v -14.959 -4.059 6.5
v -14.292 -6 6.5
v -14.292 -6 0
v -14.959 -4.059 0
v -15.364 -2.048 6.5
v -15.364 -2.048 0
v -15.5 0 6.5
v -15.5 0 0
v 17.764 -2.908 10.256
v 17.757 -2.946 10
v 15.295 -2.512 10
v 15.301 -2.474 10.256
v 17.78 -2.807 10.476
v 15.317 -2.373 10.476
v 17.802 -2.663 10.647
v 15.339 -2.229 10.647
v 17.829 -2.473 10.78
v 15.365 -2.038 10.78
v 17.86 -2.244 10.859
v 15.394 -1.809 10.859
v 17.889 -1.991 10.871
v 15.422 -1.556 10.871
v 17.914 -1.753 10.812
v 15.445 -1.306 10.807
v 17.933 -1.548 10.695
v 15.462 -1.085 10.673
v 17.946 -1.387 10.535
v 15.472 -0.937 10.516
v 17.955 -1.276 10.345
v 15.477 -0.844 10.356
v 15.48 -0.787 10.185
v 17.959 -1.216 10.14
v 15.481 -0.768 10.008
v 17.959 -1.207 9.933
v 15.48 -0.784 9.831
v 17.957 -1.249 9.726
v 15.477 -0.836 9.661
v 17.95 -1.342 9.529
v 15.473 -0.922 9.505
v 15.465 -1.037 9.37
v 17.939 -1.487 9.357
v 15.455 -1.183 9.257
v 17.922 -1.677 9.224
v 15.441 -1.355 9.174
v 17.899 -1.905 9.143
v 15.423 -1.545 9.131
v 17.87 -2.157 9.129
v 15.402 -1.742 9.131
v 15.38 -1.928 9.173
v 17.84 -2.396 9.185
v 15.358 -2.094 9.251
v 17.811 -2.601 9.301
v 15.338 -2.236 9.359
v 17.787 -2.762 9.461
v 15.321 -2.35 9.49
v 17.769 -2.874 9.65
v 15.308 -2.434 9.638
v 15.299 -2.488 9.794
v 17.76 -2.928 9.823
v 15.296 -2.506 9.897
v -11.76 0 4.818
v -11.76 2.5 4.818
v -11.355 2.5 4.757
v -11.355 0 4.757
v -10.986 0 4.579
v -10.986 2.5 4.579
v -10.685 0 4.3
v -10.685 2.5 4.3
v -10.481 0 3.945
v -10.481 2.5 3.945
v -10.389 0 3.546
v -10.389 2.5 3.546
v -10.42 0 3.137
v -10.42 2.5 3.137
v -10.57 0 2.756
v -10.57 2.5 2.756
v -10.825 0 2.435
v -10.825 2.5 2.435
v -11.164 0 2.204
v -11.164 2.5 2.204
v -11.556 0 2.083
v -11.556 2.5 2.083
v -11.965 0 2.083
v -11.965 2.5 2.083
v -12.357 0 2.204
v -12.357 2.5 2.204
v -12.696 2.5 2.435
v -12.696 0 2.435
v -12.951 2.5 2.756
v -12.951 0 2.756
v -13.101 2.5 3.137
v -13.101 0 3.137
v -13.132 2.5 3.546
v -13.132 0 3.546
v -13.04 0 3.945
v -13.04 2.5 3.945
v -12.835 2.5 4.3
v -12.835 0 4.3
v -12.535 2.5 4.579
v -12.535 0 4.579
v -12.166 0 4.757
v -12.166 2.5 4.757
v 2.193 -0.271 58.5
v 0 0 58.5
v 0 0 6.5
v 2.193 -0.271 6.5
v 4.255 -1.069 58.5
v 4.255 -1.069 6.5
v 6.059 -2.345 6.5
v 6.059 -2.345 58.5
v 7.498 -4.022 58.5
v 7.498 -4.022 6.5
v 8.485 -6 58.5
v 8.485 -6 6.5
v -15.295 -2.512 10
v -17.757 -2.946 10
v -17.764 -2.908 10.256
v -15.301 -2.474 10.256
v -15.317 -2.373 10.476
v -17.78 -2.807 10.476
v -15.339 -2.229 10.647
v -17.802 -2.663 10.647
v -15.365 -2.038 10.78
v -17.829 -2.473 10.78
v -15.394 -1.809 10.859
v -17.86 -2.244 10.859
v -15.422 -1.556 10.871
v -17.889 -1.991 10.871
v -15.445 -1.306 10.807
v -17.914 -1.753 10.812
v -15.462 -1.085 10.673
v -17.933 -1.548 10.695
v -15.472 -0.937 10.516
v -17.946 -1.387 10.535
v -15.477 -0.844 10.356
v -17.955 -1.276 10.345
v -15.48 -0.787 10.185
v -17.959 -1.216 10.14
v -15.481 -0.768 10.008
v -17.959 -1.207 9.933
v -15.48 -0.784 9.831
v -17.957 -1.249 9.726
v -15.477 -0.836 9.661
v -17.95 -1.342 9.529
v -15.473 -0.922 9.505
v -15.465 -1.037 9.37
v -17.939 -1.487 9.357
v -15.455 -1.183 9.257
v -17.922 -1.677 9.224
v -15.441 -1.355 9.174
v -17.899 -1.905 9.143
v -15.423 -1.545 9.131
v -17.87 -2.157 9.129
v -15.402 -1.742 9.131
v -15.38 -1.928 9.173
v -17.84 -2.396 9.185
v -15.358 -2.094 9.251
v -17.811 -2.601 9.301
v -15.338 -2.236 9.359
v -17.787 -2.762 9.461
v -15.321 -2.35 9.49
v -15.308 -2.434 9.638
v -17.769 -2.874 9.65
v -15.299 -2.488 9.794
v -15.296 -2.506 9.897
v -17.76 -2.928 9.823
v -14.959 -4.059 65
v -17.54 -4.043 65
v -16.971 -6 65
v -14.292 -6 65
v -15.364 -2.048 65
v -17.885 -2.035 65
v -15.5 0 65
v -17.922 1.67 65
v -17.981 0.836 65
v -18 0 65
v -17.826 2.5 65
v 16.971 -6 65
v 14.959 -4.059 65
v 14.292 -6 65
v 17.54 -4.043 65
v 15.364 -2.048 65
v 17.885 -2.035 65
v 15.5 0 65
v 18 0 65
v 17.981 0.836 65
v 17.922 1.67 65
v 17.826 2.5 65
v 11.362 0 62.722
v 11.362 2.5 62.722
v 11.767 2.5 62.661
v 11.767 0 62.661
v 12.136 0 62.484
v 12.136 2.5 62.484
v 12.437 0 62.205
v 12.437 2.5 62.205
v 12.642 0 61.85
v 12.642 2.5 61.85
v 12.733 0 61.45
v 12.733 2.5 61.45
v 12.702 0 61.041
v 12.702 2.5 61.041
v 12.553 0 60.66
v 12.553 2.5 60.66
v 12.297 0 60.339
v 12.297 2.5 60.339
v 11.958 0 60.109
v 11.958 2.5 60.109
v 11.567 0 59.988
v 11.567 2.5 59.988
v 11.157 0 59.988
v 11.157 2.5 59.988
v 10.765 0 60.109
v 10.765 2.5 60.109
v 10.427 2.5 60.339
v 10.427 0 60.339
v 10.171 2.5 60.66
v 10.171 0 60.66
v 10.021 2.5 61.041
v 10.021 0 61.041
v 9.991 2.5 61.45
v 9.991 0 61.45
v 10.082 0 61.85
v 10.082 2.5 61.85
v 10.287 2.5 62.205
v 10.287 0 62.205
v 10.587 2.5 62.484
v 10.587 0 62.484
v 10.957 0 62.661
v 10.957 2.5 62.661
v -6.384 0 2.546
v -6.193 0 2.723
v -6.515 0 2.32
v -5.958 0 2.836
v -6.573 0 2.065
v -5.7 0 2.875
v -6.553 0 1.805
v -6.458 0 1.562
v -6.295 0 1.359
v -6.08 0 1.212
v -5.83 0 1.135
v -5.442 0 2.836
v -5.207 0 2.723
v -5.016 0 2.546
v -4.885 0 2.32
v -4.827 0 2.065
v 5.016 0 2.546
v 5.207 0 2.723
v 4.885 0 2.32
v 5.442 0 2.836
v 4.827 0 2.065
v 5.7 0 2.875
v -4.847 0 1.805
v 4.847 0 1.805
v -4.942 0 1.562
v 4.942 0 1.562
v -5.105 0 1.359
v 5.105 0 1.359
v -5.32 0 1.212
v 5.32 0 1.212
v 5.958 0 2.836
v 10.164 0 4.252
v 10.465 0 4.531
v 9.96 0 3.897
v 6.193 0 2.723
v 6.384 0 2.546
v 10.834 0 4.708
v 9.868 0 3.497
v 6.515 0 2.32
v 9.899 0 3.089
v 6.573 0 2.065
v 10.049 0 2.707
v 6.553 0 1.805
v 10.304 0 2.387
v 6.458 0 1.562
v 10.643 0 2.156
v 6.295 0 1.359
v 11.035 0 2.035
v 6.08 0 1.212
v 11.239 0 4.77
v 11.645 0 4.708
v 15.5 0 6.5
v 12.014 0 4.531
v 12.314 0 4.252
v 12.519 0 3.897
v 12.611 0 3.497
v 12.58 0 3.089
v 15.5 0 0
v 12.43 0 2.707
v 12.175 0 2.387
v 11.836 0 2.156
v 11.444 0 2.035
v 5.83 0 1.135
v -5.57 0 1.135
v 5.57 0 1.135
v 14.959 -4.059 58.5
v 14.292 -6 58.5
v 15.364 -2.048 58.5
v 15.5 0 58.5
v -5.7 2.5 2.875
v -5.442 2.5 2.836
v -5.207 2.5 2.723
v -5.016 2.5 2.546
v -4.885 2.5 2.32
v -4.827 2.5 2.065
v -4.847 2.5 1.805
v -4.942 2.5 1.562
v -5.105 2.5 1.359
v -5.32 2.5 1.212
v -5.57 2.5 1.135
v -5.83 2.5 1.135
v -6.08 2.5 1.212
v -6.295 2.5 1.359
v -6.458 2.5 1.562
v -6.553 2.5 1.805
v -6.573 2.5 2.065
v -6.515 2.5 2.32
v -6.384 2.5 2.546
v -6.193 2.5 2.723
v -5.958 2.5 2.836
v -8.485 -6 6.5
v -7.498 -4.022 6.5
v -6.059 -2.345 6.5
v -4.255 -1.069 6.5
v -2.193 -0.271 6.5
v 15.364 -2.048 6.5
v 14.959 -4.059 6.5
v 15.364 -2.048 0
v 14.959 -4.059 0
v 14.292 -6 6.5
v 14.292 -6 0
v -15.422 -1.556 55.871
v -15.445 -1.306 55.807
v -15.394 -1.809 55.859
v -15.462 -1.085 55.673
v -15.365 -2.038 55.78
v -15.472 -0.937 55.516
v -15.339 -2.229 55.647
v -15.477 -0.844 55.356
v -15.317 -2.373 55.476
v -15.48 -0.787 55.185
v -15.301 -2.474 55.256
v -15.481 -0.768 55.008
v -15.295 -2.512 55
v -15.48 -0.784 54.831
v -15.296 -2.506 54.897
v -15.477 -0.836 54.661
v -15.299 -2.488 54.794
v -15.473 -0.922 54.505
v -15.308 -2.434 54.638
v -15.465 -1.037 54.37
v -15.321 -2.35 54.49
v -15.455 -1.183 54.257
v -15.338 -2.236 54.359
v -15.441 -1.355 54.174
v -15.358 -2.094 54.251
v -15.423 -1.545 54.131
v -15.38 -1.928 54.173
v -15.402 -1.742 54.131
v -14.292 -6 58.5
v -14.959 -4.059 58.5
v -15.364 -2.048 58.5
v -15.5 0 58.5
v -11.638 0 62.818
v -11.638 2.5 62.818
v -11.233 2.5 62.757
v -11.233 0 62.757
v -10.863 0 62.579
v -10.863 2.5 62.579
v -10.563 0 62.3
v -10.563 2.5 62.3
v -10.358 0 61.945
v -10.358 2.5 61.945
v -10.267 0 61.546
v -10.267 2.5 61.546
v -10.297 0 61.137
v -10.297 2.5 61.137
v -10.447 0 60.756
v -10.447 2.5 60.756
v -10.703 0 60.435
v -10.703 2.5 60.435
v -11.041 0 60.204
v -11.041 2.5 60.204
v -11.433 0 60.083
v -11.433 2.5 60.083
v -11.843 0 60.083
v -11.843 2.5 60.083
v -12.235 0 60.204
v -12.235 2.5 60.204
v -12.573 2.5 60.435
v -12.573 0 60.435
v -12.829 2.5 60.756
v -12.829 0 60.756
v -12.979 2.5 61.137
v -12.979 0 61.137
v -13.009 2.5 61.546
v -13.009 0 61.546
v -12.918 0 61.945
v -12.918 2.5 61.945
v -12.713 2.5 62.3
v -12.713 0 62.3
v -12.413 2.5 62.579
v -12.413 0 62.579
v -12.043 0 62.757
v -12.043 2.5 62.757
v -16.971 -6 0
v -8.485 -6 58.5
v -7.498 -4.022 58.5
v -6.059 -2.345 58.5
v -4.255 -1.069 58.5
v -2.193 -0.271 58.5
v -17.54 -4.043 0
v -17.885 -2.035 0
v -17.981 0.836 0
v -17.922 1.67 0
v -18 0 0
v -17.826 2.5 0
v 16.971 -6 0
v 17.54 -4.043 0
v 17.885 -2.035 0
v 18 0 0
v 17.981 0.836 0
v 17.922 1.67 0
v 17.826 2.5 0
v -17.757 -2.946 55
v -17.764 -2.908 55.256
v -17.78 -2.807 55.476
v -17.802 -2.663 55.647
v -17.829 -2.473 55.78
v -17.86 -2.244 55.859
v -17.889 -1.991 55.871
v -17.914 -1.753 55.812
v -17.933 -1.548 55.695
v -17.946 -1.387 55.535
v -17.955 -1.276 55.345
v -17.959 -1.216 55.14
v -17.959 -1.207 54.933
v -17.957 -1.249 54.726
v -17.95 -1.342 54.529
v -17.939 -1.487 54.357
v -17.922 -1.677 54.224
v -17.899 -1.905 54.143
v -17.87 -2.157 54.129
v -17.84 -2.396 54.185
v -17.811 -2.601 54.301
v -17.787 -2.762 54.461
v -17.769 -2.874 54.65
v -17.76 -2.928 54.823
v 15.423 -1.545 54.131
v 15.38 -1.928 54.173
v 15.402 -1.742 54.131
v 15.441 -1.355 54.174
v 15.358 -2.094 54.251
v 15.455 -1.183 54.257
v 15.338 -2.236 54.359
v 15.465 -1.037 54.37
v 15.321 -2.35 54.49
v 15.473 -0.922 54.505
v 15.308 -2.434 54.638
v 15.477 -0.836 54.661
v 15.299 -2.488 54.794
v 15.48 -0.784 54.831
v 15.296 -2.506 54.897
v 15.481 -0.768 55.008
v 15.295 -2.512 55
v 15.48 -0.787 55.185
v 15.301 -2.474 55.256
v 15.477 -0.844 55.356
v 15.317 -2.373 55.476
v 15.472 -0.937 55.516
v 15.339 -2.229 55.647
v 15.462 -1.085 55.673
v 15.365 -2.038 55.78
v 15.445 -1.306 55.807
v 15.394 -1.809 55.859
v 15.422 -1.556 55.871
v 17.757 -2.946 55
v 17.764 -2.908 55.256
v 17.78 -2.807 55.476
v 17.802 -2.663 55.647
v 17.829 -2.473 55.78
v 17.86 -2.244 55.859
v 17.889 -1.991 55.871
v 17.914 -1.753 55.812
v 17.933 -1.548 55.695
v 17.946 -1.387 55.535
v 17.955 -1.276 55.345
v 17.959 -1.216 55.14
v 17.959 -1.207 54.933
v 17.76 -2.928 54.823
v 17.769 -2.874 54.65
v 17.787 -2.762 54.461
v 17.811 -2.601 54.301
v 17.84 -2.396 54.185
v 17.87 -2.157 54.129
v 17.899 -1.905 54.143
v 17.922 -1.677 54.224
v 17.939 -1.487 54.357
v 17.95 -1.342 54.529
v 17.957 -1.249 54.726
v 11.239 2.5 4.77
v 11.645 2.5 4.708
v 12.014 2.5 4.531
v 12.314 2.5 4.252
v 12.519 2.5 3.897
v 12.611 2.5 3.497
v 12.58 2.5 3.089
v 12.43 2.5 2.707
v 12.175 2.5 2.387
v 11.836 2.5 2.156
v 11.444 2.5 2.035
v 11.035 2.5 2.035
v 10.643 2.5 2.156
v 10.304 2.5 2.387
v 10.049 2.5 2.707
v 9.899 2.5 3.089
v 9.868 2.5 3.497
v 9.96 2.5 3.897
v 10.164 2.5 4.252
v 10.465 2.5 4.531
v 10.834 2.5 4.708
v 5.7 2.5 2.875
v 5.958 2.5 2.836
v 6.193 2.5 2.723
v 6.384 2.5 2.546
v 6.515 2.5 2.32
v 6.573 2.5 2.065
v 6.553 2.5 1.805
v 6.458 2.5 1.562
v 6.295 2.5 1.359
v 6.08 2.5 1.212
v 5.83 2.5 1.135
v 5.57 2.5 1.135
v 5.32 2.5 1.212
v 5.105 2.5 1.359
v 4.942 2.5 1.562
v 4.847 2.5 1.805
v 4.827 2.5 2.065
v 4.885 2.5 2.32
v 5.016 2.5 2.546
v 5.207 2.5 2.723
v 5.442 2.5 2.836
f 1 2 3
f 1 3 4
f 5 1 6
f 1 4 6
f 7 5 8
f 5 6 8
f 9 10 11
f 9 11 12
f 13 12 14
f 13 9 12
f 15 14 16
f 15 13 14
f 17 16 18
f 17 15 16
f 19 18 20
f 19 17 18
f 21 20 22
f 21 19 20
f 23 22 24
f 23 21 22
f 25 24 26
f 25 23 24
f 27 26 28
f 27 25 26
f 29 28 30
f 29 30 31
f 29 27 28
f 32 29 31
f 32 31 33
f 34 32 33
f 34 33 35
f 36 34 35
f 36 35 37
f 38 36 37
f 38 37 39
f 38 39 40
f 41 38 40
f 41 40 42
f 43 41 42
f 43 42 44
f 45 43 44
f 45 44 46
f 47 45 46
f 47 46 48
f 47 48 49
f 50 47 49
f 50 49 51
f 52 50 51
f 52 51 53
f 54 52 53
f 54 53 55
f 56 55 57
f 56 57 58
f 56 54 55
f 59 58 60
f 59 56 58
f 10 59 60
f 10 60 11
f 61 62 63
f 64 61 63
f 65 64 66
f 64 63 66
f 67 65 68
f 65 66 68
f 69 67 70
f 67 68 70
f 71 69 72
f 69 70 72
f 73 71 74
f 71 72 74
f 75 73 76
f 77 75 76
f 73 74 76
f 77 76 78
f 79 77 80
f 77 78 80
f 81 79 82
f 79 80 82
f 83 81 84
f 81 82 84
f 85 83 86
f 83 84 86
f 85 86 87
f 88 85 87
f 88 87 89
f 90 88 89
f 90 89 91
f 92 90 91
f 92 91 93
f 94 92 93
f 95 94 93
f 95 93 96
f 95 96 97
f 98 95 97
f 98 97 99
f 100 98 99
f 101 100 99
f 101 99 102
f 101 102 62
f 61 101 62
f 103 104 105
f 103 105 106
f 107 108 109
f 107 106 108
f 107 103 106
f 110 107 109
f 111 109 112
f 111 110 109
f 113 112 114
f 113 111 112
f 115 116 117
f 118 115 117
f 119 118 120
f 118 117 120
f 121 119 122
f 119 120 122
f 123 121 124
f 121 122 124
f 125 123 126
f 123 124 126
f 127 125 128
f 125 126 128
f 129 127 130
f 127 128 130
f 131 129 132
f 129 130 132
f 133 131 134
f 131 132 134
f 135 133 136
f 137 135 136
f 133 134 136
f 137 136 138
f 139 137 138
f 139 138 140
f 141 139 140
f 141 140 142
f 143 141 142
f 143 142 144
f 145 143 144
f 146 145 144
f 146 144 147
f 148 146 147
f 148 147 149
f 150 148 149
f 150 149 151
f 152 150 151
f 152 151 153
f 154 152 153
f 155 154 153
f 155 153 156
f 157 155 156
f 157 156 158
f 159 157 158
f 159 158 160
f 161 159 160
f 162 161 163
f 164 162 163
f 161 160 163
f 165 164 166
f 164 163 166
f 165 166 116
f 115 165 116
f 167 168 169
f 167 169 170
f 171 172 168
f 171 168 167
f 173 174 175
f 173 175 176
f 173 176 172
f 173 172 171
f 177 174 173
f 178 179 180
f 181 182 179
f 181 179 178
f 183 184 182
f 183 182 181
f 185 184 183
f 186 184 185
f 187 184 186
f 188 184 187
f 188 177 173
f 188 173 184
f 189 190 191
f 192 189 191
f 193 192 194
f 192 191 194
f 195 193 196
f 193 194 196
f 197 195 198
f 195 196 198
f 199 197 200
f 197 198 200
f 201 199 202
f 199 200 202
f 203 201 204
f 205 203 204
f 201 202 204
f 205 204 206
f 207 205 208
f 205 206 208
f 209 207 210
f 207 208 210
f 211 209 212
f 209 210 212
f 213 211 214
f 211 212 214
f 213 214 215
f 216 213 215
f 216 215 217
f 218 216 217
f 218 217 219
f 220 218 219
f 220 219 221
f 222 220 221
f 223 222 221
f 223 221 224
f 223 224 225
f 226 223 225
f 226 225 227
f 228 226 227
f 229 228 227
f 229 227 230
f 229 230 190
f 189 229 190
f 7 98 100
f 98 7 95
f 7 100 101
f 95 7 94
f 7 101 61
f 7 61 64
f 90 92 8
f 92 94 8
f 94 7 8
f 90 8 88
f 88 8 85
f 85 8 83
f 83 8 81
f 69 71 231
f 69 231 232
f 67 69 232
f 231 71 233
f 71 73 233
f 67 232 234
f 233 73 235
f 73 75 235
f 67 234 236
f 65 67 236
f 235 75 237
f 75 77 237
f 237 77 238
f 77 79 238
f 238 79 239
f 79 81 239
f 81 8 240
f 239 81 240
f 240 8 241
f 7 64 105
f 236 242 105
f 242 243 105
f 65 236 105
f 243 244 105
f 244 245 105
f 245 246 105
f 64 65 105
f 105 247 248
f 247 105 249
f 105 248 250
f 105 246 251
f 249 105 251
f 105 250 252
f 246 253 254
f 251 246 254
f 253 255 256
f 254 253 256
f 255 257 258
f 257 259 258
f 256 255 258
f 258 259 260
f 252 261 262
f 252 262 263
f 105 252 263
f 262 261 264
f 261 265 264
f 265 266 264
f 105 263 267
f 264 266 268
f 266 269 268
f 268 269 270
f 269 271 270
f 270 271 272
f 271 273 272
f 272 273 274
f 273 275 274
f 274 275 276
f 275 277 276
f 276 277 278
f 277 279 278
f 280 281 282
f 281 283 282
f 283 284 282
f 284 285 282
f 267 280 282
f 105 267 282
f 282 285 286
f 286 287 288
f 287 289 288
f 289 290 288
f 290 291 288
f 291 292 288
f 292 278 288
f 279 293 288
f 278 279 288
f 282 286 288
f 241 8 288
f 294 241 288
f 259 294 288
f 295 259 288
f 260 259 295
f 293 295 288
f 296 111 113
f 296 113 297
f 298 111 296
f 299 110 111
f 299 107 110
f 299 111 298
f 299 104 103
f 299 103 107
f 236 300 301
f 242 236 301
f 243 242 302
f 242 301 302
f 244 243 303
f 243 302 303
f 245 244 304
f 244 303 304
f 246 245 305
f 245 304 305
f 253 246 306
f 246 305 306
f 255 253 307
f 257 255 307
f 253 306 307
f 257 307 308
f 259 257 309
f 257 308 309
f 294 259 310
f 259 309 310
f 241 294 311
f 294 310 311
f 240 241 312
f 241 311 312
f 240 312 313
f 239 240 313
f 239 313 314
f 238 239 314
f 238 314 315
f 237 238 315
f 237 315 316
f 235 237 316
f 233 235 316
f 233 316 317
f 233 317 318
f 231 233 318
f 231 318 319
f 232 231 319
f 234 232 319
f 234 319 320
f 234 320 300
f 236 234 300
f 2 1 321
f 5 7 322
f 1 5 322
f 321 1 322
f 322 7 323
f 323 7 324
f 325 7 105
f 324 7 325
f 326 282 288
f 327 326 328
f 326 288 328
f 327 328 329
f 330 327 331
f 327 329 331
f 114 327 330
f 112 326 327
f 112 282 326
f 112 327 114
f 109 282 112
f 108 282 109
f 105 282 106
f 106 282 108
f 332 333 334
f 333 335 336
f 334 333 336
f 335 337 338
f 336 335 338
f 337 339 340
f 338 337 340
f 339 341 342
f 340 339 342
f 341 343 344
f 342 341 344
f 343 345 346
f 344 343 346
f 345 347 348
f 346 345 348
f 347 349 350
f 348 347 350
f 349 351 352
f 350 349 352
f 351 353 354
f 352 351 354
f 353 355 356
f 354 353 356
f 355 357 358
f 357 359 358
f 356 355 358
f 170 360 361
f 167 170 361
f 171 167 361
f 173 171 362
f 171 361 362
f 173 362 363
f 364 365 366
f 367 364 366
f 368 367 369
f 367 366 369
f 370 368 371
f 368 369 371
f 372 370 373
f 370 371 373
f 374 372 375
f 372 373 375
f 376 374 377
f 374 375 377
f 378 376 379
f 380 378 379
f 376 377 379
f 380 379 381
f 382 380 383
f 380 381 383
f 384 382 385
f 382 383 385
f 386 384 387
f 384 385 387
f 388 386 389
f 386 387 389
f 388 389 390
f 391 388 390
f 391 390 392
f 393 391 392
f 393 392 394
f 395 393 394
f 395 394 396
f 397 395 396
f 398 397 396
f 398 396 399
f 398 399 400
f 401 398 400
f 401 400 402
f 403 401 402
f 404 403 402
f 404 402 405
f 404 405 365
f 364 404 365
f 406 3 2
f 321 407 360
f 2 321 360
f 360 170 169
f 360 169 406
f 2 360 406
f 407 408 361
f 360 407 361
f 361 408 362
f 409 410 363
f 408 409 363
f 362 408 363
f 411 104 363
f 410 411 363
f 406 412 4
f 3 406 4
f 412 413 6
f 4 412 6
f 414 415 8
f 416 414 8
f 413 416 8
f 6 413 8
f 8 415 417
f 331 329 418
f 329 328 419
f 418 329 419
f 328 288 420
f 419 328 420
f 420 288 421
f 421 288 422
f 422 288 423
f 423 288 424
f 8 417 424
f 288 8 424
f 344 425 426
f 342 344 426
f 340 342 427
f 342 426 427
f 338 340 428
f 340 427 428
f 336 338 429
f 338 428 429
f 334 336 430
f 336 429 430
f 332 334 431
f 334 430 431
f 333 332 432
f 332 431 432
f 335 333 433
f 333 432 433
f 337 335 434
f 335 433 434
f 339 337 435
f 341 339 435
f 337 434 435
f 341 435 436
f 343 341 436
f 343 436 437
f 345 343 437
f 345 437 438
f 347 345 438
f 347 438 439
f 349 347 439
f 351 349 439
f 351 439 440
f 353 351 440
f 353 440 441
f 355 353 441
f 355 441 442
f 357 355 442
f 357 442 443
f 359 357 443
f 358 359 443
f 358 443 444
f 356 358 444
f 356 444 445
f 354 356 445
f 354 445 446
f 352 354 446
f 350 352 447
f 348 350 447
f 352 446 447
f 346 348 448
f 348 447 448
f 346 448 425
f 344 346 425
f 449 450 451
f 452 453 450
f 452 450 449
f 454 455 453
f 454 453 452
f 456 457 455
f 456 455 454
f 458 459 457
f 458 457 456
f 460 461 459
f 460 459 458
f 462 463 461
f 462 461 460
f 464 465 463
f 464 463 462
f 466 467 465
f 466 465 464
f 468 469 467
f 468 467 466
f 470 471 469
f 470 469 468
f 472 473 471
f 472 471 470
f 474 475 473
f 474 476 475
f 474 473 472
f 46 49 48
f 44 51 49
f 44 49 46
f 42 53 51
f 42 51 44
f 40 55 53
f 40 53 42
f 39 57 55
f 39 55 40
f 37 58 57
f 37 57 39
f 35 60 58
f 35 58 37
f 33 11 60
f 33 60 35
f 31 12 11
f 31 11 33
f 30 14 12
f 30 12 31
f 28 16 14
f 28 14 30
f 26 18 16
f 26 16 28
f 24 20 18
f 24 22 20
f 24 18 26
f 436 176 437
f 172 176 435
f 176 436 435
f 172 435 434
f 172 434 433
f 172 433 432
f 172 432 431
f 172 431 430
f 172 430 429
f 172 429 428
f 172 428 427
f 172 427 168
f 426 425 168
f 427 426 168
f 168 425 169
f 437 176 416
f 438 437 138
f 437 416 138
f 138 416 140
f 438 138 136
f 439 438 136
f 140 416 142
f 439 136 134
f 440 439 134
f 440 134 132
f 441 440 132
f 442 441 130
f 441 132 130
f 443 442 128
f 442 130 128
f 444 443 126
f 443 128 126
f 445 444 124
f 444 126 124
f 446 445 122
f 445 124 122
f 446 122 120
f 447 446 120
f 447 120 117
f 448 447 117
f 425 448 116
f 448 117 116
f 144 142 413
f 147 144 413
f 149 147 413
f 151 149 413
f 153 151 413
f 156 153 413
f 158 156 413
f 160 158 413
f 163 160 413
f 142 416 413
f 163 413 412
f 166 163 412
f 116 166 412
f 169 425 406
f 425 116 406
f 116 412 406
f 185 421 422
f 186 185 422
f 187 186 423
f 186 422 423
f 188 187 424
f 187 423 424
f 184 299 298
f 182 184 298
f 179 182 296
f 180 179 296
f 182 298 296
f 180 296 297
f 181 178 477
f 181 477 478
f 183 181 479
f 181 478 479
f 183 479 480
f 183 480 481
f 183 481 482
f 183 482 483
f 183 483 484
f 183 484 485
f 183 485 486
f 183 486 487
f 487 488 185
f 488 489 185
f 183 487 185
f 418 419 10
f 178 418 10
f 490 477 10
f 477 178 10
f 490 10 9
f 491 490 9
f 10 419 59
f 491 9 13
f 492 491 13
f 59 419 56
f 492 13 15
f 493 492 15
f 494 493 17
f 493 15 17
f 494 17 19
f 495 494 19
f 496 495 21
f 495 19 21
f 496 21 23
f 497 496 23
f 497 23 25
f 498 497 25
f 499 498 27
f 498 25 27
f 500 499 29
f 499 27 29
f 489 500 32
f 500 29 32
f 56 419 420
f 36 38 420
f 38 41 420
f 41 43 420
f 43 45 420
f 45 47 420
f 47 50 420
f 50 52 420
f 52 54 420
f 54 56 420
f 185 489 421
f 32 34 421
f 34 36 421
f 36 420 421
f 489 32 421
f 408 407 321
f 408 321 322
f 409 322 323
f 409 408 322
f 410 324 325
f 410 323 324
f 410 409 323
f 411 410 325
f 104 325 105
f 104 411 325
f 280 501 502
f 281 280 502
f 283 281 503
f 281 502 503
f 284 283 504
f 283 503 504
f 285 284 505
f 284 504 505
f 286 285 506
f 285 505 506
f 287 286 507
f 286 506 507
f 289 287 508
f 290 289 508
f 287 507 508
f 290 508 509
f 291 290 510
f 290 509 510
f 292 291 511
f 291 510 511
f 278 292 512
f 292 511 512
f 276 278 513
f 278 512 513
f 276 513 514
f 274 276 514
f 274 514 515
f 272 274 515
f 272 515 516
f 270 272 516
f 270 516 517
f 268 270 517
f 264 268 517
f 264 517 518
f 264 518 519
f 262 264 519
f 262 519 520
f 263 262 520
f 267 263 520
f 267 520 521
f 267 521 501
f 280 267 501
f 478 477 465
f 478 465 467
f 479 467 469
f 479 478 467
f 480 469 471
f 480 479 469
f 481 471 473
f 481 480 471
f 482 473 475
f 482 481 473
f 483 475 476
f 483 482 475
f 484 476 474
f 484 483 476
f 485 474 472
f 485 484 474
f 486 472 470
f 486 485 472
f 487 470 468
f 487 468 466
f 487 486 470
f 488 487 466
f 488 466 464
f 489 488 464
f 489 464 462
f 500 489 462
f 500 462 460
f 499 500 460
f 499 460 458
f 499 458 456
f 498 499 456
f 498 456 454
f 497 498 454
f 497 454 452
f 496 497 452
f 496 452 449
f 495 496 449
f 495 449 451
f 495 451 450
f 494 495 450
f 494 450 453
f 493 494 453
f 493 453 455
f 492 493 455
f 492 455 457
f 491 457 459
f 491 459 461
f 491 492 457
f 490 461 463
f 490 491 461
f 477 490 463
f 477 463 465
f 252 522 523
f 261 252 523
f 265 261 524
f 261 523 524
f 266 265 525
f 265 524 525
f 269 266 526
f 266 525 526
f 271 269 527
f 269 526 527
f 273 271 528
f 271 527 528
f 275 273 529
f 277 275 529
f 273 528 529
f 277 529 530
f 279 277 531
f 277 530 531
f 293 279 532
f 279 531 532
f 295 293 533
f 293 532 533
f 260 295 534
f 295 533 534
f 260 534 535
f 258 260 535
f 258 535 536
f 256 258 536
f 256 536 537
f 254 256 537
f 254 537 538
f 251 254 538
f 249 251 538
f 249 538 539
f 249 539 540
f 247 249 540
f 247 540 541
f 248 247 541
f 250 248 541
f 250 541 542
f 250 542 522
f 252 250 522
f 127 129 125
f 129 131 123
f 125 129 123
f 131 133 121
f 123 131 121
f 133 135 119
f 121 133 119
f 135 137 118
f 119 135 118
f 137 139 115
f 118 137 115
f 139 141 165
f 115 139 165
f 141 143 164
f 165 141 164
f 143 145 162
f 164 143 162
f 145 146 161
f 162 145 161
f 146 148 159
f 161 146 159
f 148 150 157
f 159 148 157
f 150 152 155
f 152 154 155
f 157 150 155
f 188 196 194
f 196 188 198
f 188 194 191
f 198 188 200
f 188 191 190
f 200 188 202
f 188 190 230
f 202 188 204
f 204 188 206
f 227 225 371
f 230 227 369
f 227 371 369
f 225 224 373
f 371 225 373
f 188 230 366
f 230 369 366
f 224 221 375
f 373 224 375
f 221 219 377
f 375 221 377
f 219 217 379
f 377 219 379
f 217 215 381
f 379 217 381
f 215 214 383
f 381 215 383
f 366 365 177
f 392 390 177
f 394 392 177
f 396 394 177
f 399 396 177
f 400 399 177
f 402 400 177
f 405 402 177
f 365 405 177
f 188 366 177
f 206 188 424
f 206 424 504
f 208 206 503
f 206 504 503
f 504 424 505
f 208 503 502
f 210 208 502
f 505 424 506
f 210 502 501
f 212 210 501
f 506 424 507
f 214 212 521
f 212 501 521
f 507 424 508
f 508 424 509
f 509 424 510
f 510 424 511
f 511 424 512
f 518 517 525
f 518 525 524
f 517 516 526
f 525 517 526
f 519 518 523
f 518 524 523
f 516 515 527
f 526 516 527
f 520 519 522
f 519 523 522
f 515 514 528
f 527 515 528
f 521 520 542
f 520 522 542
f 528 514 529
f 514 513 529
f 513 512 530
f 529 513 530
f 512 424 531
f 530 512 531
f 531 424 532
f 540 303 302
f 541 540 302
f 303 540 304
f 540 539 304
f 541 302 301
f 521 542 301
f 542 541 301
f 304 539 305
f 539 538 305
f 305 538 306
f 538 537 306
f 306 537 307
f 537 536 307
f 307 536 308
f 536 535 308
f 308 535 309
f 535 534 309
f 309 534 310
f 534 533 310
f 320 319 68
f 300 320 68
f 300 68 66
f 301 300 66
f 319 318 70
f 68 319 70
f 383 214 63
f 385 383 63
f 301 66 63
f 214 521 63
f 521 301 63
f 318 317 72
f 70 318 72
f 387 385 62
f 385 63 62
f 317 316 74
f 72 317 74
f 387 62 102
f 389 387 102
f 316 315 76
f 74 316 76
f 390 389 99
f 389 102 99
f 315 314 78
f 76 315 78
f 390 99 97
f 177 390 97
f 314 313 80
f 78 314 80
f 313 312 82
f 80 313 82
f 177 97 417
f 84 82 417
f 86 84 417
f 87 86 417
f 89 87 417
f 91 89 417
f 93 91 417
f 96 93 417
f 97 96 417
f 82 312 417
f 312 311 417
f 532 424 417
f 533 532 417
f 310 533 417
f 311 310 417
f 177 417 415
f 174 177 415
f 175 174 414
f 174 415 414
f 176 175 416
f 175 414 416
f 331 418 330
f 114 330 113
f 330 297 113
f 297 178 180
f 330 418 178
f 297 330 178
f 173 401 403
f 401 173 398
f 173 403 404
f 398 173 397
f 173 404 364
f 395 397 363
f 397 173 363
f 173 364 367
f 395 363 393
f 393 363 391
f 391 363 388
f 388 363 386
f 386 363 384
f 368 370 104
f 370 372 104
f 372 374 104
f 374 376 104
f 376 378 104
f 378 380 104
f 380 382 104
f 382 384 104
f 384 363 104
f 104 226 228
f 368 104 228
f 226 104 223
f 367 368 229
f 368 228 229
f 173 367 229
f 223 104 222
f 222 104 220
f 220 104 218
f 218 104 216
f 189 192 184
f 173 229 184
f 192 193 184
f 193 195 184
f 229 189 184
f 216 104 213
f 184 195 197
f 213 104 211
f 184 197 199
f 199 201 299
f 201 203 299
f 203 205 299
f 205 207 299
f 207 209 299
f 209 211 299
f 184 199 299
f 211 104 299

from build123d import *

# Parameters (mm, degrees)
BOSS_EXTRUDE1_DEPTH     = 65
CUT_EXTRUDE1_REACH      = 70.199
SKETCH2_R               = 1.374999977
SKETCH2_R_2             = 1.374999979
SKETCH2_R_3             = 1.374999935
SKETCH2_R_4             = 1.374999972
BOSS_EXTRUDE2_DEPTH     = 65
CUT_EXTRUDE3_REACH      = 70.199
CUT_EXTRUDE3_END_RADIUS = 9
SKETCH5_R               = 0.875
CUT_EXTRUDE4_REACH      = 76.384
CUT_EXTRUDE4_END_RADIUS = 15.5
SKETCH6_R               = 0.875
BOSS_EXTRUDE3_DEPTH     = 26
CUT_EXTRUDE7_DEPTH      = 69
SKETCH11_W              = 28.583211856
SKETCH11_H              = 6.5
CUT_EXTRUDE8_DEPTH      = 69


with BuildPart() as part:
    # Sketch1 → Boss-Extrude1 (new body)
    with BuildSketch(Plane.XY):
        with BuildLine():
            ThreePointArc((16.313540167, -7.607128711), (17.573328128, -3.895913051), (18, 0))
            Line((18, 0), (15.5, 0))
            ThreePointArc((15.5, 0), (15.13258811, -3.354814016), (14.047770699, -6.550583057))
            Line((14.047770699, -6.550583057), (16.313540167, -7.607128711))
        make_face()
        with BuildLine():
            Line((15.5, 0), (18, 0))
            ThreePointArc((18, 0), (17.9563329, 1.253039812), (17.82554347, 2.5))
            Line((17.82554347, 2.5), (15.297058541, 2.5))
            ThreePointArc((15.297058541, 2.5), (15.449181328, 1.254111761), (15.5, 0))
        make_face()
        with BuildLine():
            Line((-15.297058541, 2.5), (-17.82554347, 2.5))
            ThreePointArc((-17.82554347, 2.5), (-17.9563329, 1.253039812), (-18, 0))
            Line((-18, 0), (-15.5, 0))
            ThreePointArc((-15.5, 0), (-15.449181328, 1.254111761), (-15.297058541, 2.5))
        make_face()
        with BuildLine():
            Line((0, 0), (15.5, 0))
            ThreePointArc((15.5, 0), (15.449181328, 1.254111761), (15.297058541, 2.5))
            Line((15.297058541, 2.5), (-15.297058541, 2.5))
            ThreePointArc((-15.297058541, 2.5), (-15.449181328, 1.254111761), (-15.5, 0))
            Line((-15.5, 0), (0, 0))
        make_face()
        with BuildLine():
            ThreePointArc((-18, 0), (-17.573328128, -3.895913051), (-16.313540167, -7.607128711))
            Line((-16.313540167, -7.607128711), (-14.047770699, -6.550583057))
            ThreePointArc((-14.047770699, -6.550583057), (-15.13258811, -3.354814016), (-15.5, 0))
            Line((-15.5, 0), (-18, 0))
        make_face()
        with BuildLine():
            Line((15.5, 0), (18, 0))
            ThreePointArc((18, 0), (17.9563329, 1.253039812), (17.82554347, 2.5))
            Line((17.82554347, 2.5), (15.297058541, 2.5))
            ThreePointArc((15.297058541, 2.5), (15.449181328, 1.254111761), (15.5, 0))
        make_face()
        with BuildLine():
            Line((-15.297058541, 2.5), (-17.82554347, 2.5))
            ThreePointArc((-17.82554347, 2.5), (-17.9563329, 1.253039812), (-18, 0))
            Line((-18, 0), (-15.5, 0))
            ThreePointArc((-15.5, 0), (-15.449181328, 1.254111761), (-15.297058541, 2.5))
        make_face()
    extrude(amount=BOSS_EXTRUDE1_DEPTH)

    # Sketch2 → Cut-Extrude1 (cut, up to next)
    with BuildSketch(Plane(origin=(0, 2.5, 0), x_dir=(1, 0, 0), z_dir=(0, 1, 0)), mode=Mode.PRIVATE) as cut_extrude1_sk1:
        with Locations(Location((11.239474716, -3.394559676, 0), (0, 0, 270))):
            Circle(SKETCH2_R)
    cut_extrude1_tool1 = extrude(cut_extrude1_sk1.sketch, amount=-CUT_EXTRUDE1_REACH, mode=Mode.PRIVATE) & part.part
    # Sketch2 → Cut-Extrude1 (cut, up to next)
    with BuildSketch(Plane(origin=(0, 2.5, 0), x_dir=(1, 0, 0), z_dir=(0, 1, 0)), mode=Mode.PRIVATE) as cut_extrude1_sk2:
        with Locations(Location((-11.760472903, -3.443135131, 0), (0, 0, 270))):
            Circle(SKETCH2_R_2)
    cut_extrude1_tool2 = extrude(cut_extrude1_sk2.sketch, amount=-CUT_EXTRUDE1_REACH, mode=Mode.PRIVATE) & part.part
    # Sketch2 → Cut-Extrude1 (cut, up to next)
    with BuildSketch(Plane(origin=(0, 2.5, 0), x_dir=(1, 0, 0), z_dir=(0, 1, 0)), mode=Mode.PRIVATE) as cut_extrude1_sk3:
        with Locations(Location((11.361823253, -61.347443071, 0), (0, 0, 270))):
            Circle(SKETCH2_R_3)
    cut_extrude1_tool3 = extrude(cut_extrude1_sk3.sketch, amount=-CUT_EXTRUDE1_REACH, mode=Mode.PRIVATE) & part.part
    # Sketch2 → Cut-Extrude1 (cut, up to next)
    with BuildSketch(Plane(origin=(0, 2.5, 0), x_dir=(1, 0, 0), z_dir=(0, 1, 0)), mode=Mode.PRIVATE) as cut_extrude1_sk4:
        with Locations(Location((-11.637978285, -61.443005778, 0), (0, 0, 270))):
            Circle(SKETCH2_R_4)
    cut_extrude1_tool4 = extrude(cut_extrude1_sk4.sketch, amount=-CUT_EXTRUDE1_REACH, mode=Mode.PRIVATE) & part.part
    add(cut_extrude1_tool1.solids().sort_by_distance((11.239475, 2.5, 3.39456))[0], mode=Mode.SUBTRACT)
    add(cut_extrude1_tool2.solids().sort_by_distance((-11.760473, 2.5, 3.443135))[0], mode=Mode.SUBTRACT)
    add(cut_extrude1_tool3.solids().sort_by_distance((11.361823, 2.5, 61.347443))[0], mode=Mode.SUBTRACT)
    add(cut_extrude1_tool4.solids().sort_by_distance((-11.637978, 2.5, 61.443006))[0], mode=Mode.SUBTRACT)

    # Sketch3 → Boss-Extrude2 (add)
    with BuildSketch(Plane.XY.offset(65)):
        with BuildLine():
            Line((-9, 0), (-9, -6))
            Line((-9, -6), (-8.485281374, -6))
            ThreePointArc((-8.485281374, -6), (-5.196152423, -1.651530772), (0, 0))
            Line((0, 0), (-9, 0))
        make_face()
        with BuildLine():
            ThreePointArc((0, 0), (5.196152423, -1.651530772), (8.485281374, -6))
            Line((8.485281374, -6), (9, -6))
            Line((9, -6), (9, 0))
            Line((9, 0), (0, 0))
        make_face()
    extrude(amount=-BOSS_EXTRUDE2_DEPTH)

    # Cut-Extrude3: up to this cylinder (the profile starts outside it)
    cut_extrude3_end = Plane(origin=(0, -9, 2), z_dir=(0, 0, 1)) * Cylinder(CUT_EXTRUDE3_END_RADIUS, 159.398, mode=Mode.PRIVATE)
    # Sketch5 → Cut-Extrude3 (cut, up to the surface)
    with BuildSketch(Plane(origin=(0, 2.5, 0), x_dir=(1, 0, 0), z_dir=(0, 1, 0)), mode=Mode.PRIVATE) as cut_extrude3_sk1:
        with Locations(Location((-5.7, -2, 0), (0, 0, 270))):
            Circle(SKETCH5_R)
    cut_extrude3_tool1 = extrude(cut_extrude3_sk1.sketch, amount=-CUT_EXTRUDE3_REACH, mode=Mode.PRIVATE) - cut_extrude3_end
    add(cut_extrude3_tool1.solids().sort_by_distance((-5.7, 2.5, 2))[0], mode=Mode.SUBTRACT)
    # Sketch5 → Cut-Extrude3 (cut, up to the surface)
    with BuildSketch(Plane(origin=(0, 2.5, 0), x_dir=(1, 0, 0), z_dir=(0, 1, 0)), mode=Mode.PRIVATE) as cut_extrude3_sk2:
        with Locations(Location((5.7, -2, 0), (0, 0, 270))):
            Circle(SKETCH5_R)
    cut_extrude3_tool2 = extrude(cut_extrude3_sk2.sketch, amount=-CUT_EXTRUDE3_REACH, mode=Mode.PRIVATE) - cut_extrude3_end
    add(cut_extrude3_tool2.solids().sort_by_distance((5.7, 2.5, 2))[0], mode=Mode.SUBTRACT)

    # Cut-Extrude4: up to this cylinder (the profile starts outside it)
    cut_extrude4_end = Plane(origin=(0, 0, 32.5), z_dir=(0, 0, -1)) * Cylinder(CUT_EXTRUDE4_END_RADIUS, 229.768, mode=Mode.PRIVATE)
    # Sketch6 → Cut-Extrude4 (cut, up to the surface)
    with BuildSketch(Plane(origin=(-17.726539554, -3.125667198, 0), x_dir=(0, 0, -1), z_dir=(-0.984807753012208, -0.17364817766693072, 0)), mode=Mode.PRIVATE) as cut_extrude4_sk1:
        with Locations(Location((-55, -1.057392522, 0), (0, 0, 90))):
            Circle(SKETCH6_R)
    cut_extrude4_tool1 = extrude(cut_extrude4_sk1.sketch, amount=-CUT_EXTRUDE4_REACH, mode=Mode.PRIVATE) - cut_extrude4_end
    # Sketch6 → Cut-Extrude4 (cut, up to the surface)
    with BuildSketch(Plane(origin=(-17.726539554, -3.125667198, 0), x_dir=(0, 0, -1), z_dir=(-0.984807753012208, -0.17364817766693072, 0)), mode=Mode.PRIVATE) as cut_extrude4_sk2:
        with Locations(Location((-10, -1.057392522, 0), (0, 0, 90))):
            Circle(SKETCH6_R)
    cut_extrude4_tool2 = extrude(cut_extrude4_sk2.sketch, amount=-CUT_EXTRUDE4_REACH, mode=Mode.PRIVATE) - cut_extrude4_end
    cut_extrude4 = cut_extrude4_tool1.solids().sort_by_distance((-17.910154, -2.084339, 55))[0] + cut_extrude4_tool2.solids().sort_by_distance((-17.910154, -2.084339, 10))[0]
    add(cut_extrude4, mode=Mode.SUBTRACT)

    # Mirror1: Cut-Extrude4 across plane
    add(cut_extrude4.mirror(Plane(origin=(0, 0, 0), x_dir=(0, 0, 1), z_dir=(1, 0, 0))), mode=Mode.SUBTRACT)

    # Sketch8 → Boss-Extrude3 (add, symmetric)
    with BuildSketch(Plane.XY.offset(32.5)):
        with BuildLine():
            Line((-14.291605928, -6), (-9, -6))
            Line((-9, -6), (-9, 0))
            Line((-9, 0), (-15.5, 0))
            ThreePointArc((-15.5, 0), (-15.194898682, -3.060237582), (-14.291605928, -6))
        make_face()
        with BuildLine():
            Line((9, 0), (9, -6))
            Line((9, -6), (14.291605928, -6))
            ThreePointArc((14.291605928, -6), (15.194898682, -3.060237582), (15.5, 0))
            Line((15.5, 0), (9, 0))
        make_face()
    extrude(amount=BOSS_EXTRUDE3_DEPTH, both=True)

    # Sketch9 → Cut-Extrude7 (cut)
    with BuildSketch(Plane.XY.offset(65)):
        with BuildLine():
            ThreePointArc((-14.047770699, -6.550583057), (-14.172362271, -6.276475737), (-14.291605928, -6))
            Line((-14.291605928, -6), (-16.970562748, -6))
            ThreePointArc((-16.970562748, -6), (-16.661440286, -6.811490851), (-16.313540167, -7.607128711))
            Line((-16.313540167, -7.607128711), (-14.047770699, -6.550583057))
        make_face()
        with BuildLine():
            Line((16.970562748, -6), (14.291605928, -6))
            ThreePointArc((14.291605928, -6), (14.172362271, -6.276475737), (14.047770699, -6.550583057))
            Line((14.047770699, -6.550583057), (16.313540167, -7.607128711))
            ThreePointArc((16.313540167, -7.607128711), (16.661440286, -6.811490851), (16.970562748, -6))
        make_face()
    extrude(amount=-CUT_EXTRUDE7_DEPTH, mode=Mode.SUBTRACT)

    # Sketch11 → Cut-Extrude8 (cut)
    with BuildSketch(Plane(origin=(0, 0, 0), x_dir=(-1, 0, 0), z_dir=(0, -1, 0))):
        with Locations((0, -61.75)):
            Rectangle(SKETCH11_W, SKETCH11_H)
        with Locations((0, -3.25)):
            Rectangle(SKETCH11_W, SKETCH11_H)
    extrude(amount=CUT_EXTRUDE8_DEPTH, mode=Mode.SUBTRACT)


solid = part.part
